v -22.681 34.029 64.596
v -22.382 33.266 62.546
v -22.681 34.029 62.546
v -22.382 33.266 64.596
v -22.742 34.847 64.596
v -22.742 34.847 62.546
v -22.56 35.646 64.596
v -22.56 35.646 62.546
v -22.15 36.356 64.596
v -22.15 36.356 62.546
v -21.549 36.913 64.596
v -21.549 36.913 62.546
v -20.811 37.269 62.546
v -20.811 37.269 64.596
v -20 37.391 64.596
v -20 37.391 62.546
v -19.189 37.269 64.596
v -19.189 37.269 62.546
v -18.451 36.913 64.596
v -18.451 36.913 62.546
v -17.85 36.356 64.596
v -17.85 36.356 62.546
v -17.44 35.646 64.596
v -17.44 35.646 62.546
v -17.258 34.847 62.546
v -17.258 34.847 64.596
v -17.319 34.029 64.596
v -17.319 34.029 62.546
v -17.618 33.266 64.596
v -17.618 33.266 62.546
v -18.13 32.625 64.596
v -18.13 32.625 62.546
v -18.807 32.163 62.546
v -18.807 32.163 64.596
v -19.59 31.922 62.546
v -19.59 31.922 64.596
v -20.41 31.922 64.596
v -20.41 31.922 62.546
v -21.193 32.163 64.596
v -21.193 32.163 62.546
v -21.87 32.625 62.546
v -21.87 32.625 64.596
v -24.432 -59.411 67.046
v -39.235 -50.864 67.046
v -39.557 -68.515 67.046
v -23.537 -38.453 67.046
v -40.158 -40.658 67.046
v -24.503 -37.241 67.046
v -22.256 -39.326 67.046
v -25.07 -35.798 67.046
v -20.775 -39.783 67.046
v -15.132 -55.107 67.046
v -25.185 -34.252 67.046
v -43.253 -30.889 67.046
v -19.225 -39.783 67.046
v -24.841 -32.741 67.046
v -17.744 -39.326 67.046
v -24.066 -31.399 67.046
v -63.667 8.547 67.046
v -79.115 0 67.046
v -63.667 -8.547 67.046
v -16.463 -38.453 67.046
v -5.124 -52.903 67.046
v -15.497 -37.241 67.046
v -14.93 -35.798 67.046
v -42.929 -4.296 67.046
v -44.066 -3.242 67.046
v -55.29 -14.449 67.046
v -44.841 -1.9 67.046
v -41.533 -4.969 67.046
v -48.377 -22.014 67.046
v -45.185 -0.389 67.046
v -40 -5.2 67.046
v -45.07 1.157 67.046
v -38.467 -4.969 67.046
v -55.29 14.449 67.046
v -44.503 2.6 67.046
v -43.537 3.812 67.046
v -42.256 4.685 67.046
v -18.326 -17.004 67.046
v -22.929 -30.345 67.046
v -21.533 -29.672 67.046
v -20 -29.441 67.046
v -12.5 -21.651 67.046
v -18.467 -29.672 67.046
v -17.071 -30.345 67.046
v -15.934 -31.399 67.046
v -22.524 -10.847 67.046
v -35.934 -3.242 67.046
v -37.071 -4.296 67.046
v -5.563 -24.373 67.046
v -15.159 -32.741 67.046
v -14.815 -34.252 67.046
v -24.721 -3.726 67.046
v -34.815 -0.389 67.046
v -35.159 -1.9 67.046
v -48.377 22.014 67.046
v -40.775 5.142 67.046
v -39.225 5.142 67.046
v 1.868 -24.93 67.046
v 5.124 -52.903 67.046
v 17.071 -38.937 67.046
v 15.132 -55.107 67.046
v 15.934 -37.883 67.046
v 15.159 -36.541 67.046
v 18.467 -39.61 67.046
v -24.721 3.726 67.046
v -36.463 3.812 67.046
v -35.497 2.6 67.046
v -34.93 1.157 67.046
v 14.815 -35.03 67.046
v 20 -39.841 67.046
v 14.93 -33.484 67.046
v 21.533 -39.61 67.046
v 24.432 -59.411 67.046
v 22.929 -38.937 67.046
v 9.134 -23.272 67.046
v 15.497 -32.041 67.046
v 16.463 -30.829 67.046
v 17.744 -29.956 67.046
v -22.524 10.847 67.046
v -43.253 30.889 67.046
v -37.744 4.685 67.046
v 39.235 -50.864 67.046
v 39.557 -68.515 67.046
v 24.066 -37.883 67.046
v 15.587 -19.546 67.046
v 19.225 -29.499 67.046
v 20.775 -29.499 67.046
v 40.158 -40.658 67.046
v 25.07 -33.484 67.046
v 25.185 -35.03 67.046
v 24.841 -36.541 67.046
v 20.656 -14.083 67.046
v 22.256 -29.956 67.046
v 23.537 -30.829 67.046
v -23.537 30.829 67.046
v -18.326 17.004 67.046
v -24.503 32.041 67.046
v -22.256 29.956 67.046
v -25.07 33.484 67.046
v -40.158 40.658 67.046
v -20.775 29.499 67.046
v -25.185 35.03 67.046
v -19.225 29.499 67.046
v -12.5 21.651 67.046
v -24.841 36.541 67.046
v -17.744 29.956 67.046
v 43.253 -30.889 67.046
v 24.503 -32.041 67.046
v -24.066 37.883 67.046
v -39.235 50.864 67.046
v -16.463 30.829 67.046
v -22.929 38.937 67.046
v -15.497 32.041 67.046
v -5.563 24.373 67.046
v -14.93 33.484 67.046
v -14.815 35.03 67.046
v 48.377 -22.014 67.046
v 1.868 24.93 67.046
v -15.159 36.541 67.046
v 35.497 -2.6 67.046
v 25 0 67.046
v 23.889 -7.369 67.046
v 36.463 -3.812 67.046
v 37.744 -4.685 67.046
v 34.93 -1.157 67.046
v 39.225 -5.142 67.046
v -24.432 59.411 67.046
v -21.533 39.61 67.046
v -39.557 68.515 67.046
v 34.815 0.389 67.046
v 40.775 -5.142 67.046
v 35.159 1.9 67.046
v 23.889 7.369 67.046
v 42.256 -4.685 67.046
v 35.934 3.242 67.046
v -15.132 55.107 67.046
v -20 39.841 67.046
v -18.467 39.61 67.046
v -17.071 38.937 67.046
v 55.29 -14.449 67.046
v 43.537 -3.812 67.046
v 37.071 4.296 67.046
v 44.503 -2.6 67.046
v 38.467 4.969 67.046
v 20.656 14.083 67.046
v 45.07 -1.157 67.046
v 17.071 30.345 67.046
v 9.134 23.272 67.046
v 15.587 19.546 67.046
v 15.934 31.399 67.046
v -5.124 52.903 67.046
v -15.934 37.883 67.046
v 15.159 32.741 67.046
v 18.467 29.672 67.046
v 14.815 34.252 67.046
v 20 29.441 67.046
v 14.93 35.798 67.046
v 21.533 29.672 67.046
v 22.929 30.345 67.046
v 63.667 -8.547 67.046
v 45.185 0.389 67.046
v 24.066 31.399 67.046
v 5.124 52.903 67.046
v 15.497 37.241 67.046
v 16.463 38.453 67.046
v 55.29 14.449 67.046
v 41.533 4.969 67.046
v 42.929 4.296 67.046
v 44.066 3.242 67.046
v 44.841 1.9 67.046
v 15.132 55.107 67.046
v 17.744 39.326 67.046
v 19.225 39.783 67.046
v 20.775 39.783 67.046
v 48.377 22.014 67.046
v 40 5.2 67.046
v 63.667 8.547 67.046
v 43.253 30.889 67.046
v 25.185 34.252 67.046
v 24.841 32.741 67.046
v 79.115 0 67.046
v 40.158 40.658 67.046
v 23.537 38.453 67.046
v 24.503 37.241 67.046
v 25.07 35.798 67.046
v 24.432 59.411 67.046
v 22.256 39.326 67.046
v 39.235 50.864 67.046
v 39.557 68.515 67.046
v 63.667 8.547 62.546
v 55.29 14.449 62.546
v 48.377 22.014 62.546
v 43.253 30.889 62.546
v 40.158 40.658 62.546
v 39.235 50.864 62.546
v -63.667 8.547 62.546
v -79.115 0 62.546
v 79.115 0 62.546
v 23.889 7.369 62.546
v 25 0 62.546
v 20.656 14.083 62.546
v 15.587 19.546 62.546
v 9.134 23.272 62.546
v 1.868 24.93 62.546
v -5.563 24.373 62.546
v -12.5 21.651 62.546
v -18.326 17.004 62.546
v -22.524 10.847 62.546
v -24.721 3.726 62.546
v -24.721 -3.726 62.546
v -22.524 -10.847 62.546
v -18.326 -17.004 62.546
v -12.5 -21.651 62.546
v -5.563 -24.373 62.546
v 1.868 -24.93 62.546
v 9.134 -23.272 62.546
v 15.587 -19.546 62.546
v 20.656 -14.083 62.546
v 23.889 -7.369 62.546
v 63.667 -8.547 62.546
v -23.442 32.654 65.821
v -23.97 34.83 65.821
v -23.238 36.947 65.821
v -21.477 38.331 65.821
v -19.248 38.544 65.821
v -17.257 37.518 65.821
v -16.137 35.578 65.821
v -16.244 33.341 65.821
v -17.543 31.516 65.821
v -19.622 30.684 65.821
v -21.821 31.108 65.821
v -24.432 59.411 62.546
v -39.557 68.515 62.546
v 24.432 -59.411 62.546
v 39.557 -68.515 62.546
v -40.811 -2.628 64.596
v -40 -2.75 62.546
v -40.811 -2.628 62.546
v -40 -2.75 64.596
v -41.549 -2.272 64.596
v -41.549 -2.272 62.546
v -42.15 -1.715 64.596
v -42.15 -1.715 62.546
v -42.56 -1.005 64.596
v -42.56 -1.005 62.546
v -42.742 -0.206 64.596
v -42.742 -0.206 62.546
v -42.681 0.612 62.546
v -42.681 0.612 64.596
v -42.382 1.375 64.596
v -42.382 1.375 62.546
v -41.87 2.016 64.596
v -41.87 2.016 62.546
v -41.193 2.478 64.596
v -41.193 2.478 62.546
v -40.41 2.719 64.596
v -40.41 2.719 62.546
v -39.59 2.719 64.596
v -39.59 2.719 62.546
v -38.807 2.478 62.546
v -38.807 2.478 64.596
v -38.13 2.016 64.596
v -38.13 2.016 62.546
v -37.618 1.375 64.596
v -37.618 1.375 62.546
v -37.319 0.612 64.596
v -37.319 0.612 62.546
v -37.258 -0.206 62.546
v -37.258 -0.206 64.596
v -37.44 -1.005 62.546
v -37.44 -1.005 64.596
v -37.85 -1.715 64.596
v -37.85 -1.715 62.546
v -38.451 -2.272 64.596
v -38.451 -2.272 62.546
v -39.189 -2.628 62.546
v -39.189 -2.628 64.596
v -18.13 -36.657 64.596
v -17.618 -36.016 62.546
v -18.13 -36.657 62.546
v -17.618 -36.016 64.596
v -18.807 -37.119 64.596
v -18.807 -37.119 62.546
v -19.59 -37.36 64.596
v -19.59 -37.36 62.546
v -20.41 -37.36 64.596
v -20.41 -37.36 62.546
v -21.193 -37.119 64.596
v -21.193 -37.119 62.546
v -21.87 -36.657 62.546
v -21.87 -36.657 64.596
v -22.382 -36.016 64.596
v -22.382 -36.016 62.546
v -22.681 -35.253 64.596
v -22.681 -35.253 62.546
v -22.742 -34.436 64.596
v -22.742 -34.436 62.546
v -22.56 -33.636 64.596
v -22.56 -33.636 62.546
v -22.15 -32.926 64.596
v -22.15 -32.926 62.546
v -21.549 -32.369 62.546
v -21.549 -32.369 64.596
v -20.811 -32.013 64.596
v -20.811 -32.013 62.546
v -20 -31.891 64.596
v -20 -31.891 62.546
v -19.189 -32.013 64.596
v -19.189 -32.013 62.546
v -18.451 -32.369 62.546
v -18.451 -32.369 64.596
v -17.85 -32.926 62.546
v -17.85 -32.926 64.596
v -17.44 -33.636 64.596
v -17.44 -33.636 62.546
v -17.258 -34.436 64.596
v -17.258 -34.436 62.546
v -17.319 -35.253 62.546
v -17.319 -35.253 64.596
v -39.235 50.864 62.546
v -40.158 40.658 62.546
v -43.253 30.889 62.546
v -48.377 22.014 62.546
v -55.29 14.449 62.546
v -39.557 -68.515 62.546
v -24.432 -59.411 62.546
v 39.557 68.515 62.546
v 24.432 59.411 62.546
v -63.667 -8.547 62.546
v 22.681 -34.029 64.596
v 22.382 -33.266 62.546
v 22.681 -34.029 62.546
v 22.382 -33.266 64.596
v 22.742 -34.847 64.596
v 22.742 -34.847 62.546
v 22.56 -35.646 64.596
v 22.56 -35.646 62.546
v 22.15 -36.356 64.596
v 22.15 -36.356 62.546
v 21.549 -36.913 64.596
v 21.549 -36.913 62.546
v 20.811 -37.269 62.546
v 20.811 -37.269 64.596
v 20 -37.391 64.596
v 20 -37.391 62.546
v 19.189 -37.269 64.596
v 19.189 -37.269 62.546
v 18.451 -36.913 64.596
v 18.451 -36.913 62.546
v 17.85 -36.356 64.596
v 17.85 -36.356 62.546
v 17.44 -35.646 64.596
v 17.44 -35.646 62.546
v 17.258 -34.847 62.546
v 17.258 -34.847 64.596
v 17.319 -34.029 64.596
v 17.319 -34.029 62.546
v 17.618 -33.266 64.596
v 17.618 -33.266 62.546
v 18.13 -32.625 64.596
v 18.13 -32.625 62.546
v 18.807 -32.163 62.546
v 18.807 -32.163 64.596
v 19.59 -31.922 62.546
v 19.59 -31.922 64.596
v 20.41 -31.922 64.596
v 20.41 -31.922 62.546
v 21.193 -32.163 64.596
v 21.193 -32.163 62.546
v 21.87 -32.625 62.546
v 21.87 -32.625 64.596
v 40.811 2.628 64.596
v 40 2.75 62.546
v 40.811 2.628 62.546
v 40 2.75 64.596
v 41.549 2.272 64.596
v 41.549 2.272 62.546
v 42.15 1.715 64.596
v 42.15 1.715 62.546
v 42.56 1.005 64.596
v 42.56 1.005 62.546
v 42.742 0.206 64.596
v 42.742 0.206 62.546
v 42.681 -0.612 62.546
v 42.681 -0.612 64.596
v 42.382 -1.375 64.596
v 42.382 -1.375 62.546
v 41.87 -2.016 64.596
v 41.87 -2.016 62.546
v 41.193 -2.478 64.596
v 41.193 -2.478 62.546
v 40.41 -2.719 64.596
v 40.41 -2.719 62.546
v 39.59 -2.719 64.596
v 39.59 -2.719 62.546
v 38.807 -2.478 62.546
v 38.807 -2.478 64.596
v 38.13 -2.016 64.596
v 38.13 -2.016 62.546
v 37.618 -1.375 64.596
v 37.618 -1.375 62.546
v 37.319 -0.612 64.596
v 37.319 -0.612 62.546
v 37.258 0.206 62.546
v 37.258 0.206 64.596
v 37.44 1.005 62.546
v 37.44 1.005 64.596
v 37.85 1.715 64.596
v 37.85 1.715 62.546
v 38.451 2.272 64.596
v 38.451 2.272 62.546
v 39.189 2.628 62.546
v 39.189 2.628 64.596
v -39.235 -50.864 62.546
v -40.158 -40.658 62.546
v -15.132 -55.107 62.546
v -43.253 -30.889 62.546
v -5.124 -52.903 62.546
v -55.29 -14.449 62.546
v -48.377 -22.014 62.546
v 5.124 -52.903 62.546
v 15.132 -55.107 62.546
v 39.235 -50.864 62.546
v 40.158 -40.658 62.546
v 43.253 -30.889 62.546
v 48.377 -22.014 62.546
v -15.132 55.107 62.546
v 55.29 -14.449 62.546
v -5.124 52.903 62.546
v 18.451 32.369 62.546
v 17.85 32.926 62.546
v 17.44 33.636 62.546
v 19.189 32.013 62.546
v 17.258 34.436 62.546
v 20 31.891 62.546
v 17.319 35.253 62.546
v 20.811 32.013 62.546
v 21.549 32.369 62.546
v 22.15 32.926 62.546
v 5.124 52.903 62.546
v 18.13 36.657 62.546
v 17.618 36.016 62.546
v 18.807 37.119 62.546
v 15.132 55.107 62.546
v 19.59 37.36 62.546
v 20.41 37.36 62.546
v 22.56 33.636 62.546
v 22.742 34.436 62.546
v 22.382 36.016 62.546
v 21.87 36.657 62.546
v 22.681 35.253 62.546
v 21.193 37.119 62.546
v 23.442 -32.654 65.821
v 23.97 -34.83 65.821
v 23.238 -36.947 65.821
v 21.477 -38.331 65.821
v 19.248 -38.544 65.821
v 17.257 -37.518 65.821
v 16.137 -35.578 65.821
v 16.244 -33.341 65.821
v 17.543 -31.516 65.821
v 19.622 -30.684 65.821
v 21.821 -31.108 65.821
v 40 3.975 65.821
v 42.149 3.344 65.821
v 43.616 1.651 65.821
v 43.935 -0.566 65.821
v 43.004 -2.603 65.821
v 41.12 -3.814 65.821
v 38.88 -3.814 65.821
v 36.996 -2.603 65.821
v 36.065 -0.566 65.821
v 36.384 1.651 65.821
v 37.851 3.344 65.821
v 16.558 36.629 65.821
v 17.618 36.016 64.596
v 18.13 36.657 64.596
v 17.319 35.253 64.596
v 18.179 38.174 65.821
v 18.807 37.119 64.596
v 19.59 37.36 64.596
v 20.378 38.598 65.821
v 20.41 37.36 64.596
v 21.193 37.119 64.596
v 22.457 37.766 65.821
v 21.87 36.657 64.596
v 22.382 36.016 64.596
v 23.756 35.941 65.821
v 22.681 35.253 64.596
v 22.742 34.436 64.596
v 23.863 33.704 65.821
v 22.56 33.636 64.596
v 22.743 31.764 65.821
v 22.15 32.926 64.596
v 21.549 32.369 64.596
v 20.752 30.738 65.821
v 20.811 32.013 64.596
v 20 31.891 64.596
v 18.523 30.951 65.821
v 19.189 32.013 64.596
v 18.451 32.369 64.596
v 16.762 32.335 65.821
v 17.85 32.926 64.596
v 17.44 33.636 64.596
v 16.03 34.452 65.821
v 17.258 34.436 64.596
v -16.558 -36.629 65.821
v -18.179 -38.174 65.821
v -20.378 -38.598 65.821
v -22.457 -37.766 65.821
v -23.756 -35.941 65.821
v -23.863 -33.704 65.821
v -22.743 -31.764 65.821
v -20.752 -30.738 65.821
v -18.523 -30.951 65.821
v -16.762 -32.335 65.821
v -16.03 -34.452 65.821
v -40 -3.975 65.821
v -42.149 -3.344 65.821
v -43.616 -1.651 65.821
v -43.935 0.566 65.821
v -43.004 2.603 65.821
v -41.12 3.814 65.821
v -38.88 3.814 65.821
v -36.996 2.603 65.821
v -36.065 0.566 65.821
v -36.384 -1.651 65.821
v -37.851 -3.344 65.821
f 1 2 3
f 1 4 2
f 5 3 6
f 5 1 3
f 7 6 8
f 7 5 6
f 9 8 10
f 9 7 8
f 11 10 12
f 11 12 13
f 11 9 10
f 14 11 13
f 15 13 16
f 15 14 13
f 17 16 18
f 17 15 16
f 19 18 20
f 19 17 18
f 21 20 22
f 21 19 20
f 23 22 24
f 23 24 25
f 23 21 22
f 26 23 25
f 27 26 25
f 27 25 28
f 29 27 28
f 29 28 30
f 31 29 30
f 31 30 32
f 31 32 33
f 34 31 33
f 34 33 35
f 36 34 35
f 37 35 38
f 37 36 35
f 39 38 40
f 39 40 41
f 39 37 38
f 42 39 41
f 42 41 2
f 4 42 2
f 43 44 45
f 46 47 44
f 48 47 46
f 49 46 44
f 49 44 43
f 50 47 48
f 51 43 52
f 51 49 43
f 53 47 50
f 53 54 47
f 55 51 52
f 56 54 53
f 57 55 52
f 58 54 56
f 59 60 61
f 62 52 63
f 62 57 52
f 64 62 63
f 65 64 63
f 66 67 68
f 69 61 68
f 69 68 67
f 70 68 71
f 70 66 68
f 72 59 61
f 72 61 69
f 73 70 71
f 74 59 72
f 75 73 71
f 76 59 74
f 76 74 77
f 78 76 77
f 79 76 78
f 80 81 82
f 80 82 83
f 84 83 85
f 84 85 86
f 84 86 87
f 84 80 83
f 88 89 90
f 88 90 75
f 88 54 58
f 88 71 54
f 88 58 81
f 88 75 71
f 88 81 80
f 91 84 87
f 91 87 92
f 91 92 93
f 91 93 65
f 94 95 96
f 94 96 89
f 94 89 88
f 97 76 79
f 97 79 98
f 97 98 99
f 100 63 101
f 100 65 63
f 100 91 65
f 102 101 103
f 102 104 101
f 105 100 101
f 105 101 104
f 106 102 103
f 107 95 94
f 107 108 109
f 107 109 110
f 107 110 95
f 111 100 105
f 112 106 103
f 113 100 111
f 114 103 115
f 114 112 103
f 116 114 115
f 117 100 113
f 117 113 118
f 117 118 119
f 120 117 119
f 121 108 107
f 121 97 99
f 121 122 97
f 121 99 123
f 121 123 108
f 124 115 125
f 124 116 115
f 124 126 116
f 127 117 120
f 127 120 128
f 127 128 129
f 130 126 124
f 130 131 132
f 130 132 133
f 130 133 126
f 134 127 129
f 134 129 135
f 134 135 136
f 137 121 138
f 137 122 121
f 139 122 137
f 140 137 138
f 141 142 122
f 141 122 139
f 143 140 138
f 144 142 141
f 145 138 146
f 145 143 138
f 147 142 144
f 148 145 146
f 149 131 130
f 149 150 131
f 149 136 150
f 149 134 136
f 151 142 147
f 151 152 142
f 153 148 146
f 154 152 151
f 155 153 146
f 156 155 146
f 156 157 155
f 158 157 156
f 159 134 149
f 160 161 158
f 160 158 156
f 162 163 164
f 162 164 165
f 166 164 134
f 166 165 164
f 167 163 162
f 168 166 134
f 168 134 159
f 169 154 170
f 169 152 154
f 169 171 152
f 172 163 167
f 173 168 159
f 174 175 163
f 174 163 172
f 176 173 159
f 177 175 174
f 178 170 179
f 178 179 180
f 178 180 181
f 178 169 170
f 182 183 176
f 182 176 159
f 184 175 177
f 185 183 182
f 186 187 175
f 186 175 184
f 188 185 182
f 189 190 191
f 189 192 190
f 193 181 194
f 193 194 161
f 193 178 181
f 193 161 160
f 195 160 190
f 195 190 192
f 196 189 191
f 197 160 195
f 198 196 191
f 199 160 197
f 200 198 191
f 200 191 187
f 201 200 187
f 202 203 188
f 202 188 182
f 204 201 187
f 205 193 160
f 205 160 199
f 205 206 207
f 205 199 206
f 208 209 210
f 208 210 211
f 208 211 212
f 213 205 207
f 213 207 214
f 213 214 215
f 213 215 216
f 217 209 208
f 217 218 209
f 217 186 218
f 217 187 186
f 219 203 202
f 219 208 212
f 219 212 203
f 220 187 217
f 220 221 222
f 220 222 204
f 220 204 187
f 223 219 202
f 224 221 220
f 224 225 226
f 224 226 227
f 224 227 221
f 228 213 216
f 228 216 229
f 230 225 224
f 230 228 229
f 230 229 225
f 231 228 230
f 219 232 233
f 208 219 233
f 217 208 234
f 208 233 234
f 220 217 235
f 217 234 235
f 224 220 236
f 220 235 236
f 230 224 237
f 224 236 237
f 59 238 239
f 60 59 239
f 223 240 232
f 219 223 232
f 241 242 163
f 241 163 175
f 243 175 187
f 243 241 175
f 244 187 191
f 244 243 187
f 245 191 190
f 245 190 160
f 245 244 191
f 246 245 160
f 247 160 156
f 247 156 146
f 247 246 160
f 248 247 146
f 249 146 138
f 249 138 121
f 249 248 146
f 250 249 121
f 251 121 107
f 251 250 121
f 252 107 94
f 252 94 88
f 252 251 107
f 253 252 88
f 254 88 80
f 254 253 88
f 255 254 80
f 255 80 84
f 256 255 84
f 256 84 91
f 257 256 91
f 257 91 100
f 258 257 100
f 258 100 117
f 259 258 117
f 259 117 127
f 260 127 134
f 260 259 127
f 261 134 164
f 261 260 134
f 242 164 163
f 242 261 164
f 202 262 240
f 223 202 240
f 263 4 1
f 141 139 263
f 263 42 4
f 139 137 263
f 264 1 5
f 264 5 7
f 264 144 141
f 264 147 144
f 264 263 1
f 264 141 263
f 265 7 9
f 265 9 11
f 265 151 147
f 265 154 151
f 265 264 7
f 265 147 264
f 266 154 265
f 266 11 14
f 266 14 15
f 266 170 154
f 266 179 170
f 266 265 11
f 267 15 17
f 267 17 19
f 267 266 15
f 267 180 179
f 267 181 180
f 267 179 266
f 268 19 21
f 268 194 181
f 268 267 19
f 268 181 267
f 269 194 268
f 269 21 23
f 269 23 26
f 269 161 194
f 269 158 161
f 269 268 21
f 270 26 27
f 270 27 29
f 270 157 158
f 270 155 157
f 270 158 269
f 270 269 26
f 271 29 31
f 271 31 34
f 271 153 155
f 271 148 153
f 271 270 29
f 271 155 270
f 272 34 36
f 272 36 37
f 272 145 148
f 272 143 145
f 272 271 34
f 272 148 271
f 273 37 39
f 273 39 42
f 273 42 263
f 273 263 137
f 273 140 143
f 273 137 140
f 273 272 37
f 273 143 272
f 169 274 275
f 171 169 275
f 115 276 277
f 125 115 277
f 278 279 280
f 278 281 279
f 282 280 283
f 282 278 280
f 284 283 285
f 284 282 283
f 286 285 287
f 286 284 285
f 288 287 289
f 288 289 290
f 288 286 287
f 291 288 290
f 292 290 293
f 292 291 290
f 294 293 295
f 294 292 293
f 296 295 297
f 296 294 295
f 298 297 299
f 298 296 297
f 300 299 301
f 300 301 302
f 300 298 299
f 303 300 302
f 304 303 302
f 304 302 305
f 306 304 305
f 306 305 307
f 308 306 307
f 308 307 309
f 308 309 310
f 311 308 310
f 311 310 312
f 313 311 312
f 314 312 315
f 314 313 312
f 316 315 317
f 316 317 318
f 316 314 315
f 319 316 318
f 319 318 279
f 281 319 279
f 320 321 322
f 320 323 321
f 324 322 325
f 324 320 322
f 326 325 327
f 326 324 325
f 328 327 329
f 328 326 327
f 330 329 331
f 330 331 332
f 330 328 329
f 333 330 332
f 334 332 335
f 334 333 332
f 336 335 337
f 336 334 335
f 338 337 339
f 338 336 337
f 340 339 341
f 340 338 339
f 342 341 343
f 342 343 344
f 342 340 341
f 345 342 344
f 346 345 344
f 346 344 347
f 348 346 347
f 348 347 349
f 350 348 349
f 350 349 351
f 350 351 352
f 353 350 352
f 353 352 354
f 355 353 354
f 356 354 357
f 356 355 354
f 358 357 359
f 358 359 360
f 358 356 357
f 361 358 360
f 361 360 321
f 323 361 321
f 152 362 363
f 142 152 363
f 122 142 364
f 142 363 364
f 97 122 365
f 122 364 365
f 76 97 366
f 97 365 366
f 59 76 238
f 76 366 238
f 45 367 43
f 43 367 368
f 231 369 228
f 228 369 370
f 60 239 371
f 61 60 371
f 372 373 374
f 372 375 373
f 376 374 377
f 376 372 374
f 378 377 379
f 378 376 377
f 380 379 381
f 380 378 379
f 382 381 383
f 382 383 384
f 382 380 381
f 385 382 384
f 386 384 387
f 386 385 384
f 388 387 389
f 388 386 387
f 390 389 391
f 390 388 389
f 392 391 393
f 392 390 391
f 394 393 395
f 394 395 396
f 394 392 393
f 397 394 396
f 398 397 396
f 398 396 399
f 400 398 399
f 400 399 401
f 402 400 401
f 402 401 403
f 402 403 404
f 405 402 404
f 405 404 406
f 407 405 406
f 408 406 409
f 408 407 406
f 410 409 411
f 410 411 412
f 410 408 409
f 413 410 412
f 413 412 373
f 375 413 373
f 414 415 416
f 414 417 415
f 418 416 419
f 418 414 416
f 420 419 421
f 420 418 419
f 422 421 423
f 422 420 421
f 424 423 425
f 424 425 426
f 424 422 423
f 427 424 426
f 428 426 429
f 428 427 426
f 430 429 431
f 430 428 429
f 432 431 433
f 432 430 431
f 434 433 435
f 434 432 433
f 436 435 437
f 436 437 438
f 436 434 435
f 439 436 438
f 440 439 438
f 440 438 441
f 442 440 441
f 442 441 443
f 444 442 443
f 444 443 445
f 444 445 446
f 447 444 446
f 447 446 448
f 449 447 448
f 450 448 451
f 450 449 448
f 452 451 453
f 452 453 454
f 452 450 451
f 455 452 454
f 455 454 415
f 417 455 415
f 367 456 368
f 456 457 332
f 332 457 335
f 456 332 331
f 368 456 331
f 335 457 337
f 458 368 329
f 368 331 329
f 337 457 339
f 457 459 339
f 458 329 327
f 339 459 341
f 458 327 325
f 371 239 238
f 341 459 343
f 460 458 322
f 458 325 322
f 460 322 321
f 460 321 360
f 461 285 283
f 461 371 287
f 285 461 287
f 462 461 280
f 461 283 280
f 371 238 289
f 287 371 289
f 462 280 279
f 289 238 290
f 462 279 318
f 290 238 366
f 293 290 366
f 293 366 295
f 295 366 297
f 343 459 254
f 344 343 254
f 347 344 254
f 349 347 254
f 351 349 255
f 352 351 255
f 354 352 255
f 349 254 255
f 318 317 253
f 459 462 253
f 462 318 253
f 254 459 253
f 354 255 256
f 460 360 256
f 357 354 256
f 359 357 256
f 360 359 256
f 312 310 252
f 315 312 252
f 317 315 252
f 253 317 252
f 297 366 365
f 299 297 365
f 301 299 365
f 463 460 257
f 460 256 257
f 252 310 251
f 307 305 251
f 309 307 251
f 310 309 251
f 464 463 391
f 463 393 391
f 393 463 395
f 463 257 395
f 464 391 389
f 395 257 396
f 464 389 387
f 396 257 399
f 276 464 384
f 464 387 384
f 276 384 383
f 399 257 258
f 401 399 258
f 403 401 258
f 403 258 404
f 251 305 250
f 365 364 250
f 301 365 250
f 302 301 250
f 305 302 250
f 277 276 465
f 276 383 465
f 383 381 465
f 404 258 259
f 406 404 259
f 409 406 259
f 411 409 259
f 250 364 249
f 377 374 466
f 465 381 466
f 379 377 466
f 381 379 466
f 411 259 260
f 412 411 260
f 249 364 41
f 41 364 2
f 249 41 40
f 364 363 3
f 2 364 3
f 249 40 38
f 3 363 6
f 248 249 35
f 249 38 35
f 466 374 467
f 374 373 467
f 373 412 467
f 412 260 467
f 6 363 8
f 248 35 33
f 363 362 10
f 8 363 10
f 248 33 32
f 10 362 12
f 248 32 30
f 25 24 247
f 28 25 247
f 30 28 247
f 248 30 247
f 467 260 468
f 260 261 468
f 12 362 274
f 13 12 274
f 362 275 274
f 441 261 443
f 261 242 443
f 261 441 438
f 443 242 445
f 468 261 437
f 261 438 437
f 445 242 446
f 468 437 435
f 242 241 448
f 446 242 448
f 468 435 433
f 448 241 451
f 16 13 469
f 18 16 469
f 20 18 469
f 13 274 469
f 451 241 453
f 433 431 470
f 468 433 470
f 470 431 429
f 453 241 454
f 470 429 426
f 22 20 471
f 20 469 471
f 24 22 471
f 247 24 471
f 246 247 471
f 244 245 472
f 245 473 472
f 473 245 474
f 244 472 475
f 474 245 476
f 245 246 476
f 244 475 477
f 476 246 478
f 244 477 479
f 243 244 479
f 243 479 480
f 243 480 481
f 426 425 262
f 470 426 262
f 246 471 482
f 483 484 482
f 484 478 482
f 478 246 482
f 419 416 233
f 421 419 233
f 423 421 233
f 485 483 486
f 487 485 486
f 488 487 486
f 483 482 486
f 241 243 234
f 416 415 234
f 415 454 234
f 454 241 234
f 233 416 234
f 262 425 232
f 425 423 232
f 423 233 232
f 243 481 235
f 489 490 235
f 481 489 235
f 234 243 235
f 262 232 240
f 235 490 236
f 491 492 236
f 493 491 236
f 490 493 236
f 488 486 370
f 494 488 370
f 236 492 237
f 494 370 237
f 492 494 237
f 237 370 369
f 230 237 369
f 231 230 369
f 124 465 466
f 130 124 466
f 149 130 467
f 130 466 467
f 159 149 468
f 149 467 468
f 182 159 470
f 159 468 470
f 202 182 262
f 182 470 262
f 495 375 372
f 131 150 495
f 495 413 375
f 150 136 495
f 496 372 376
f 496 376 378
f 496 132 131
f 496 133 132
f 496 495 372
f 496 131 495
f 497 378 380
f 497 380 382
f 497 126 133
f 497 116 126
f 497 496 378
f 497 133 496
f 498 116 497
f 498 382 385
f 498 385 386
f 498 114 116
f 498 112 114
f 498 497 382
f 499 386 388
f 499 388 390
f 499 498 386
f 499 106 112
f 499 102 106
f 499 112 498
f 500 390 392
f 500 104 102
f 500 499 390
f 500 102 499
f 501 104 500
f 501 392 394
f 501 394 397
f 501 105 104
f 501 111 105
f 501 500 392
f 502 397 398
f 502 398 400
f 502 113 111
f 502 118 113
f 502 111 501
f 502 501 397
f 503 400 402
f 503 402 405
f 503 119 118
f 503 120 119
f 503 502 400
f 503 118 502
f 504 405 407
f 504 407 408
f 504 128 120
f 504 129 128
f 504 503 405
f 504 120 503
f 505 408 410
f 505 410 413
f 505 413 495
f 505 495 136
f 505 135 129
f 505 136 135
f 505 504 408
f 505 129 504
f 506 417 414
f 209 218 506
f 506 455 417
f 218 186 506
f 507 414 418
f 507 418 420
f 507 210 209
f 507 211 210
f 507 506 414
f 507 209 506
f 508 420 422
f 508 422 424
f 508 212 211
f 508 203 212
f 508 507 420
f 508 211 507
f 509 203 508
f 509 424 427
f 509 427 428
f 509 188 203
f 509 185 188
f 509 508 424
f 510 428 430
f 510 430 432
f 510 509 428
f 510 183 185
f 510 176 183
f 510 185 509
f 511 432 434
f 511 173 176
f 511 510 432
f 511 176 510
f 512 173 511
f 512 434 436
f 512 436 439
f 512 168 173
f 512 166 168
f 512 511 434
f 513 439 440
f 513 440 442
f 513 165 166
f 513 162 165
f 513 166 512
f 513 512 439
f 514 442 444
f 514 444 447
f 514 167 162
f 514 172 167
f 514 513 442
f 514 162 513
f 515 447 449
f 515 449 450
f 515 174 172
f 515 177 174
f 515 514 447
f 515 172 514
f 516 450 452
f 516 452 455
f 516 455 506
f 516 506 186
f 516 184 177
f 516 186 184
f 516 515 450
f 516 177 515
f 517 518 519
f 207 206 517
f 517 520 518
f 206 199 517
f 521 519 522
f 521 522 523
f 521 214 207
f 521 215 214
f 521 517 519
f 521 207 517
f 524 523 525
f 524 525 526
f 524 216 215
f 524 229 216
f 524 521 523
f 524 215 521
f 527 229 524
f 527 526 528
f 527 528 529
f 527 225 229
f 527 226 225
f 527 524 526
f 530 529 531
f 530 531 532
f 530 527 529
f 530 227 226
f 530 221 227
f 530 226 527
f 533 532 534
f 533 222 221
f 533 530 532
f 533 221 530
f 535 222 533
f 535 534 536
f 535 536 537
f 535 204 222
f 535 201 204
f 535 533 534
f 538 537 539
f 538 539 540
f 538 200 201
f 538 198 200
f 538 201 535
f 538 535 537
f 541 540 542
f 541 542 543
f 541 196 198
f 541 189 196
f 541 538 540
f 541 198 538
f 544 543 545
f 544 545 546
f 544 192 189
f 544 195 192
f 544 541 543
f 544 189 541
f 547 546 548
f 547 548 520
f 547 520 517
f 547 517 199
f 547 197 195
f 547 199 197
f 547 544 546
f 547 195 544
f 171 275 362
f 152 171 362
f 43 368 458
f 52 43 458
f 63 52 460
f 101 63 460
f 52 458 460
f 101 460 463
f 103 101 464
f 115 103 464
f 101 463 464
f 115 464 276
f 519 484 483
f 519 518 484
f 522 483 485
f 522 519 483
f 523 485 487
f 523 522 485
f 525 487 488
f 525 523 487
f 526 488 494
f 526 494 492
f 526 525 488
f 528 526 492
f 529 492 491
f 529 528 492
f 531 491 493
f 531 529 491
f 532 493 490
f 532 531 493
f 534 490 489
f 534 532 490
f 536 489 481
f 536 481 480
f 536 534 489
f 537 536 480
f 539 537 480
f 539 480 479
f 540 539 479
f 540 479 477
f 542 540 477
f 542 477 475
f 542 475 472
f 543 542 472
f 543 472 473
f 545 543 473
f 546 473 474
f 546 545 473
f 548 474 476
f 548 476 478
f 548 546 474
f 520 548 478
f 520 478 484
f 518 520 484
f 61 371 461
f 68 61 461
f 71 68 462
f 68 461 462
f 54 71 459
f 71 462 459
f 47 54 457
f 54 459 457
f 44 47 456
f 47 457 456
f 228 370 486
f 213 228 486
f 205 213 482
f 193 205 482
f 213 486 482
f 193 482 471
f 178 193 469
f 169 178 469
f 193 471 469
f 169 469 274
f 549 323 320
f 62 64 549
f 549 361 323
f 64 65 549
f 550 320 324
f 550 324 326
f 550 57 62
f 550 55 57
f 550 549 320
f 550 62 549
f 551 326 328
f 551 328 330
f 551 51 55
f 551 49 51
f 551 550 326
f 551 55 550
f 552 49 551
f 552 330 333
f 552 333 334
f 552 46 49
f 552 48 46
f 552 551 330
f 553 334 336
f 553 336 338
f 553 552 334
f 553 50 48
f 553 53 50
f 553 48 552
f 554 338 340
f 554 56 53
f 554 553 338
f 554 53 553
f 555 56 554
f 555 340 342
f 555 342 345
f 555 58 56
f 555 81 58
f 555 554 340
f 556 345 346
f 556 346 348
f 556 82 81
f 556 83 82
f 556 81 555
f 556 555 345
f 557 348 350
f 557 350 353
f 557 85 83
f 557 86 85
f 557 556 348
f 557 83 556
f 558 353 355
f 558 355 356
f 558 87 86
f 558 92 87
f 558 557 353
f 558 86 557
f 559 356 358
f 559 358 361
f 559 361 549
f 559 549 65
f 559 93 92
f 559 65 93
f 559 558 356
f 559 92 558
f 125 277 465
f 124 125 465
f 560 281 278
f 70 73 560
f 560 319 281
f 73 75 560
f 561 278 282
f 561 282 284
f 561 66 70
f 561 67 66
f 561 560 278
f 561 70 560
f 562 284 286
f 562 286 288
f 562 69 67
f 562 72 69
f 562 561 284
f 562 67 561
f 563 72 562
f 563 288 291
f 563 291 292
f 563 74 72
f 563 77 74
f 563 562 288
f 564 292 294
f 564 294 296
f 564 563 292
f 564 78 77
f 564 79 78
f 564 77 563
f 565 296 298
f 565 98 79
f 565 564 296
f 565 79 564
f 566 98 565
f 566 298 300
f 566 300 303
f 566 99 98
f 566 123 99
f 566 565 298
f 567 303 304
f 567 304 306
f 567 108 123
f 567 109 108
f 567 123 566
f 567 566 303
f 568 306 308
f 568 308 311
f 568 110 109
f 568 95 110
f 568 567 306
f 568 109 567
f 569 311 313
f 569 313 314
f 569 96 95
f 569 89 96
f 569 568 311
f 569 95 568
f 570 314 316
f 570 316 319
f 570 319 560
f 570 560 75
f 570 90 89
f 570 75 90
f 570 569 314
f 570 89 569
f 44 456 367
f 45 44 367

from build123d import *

# Parameters (mm, degrees)
SKETCH7_R           = 25
BOSS_EXTRUDE5_DEPTH = 4.5
CIRPATTERN1_COUNT   = 6


with BuildPart() as part:
    # Sketch7 → Boss-Extrude5 (new body)
    with BuildSketch(Plane.XY.offset(62.545612614)):
        with BuildLine():
            Line((-39.557386288, -68.515402865), (-24.43179769, -59.410864919))
            ThreePointArc((-24.43179769, -59.410864919), (0, -52.625), (24.43179769, -59.410864919))
            Line((24.43179769, -59.410864919), (39.557386288, -68.515402865))
            Line((39.557386288, -68.515402865), (39.235419436, -50.863989919))
            ThreePointArc((39.235419436, -50.863989919), (45.574586874, -26.3125), (63.667217125, -8.546875))
            Line((63.667217125, -8.546875), (79.114772576, 0))
            Line((79.114772576, 0), (63.667217125, 8.546875))
            ThreePointArc((63.667217125, 8.546875), (45.574586874, 26.3125), (39.235419436, 50.863989919))
            Line((39.235419436, 50.863989919), (39.557386288, 68.515402865))
            Line((39.557386288, 68.515402865), (24.43179769, 59.410864919))
            ThreePointArc((24.43179769, 59.410864919), (0, 52.625), (-24.43179769, 59.410864919))
            Line((-24.43179769, 59.410864919), (-39.557386288, 68.515402865))
            Line((-39.557386288, 68.515402865), (-39.235419436, 50.863989919))
            ThreePointArc((-39.235419436, 50.863989919), (-45.574586874, 26.3125), (-63.667217125, 8.546875))
            Line((-63.667217125, 8.546875), (-79.114772576, 0))
            Line((-79.114772576, 0), (-63.667217125, -8.546875))
            ThreePointArc((-63.667217125, -8.546875), (-45.574586874, -26.3125), (-39.235419436, -50.863989919))
            Line((-39.235419436, -50.863989919), (-39.557386288, -68.515402865))
        make_face()
        Circle(SKETCH7_R, mode=Mode.SUBTRACT)
    extrude(amount=BOSS_EXTRUDE5_DEPTH)

    # Sketch11 → CSK for M5 Flat Head Machine Screw1 (revolve, cut)
    with BuildSketch(Plane(origin=(-40, 0, 67.045612614), x_dir=(0, -1, 0), z_dir=(1, 0, 0))):
        Polygon((0, 0), (0, 4.5), (2.75, 4.5), (2.75, 2.45), (5.2, 0), align=None)
    csk_for_m5_flat_head_machine_screw1 = revolve(axis=Axis((-40, 0, 73.395612614), (0, 0, -1)), mode=Mode.SUBTRACT)

    # CirPattern1: CSK for M5 Flat Head Machine Screw1 ×6 about axis
    cirpattern1_axis = Axis((0, 0, 0), (0, 0, 1))
    for i in range(1, CIRPATTERN1_COUNT):
        add(csk_for_m5_flat_head_machine_screw1.rotate(cirpattern1_axis, i * 360 / CIRPATTERN1_COUNT), mode=Mode.SUBTRACT)


solid = part.part
